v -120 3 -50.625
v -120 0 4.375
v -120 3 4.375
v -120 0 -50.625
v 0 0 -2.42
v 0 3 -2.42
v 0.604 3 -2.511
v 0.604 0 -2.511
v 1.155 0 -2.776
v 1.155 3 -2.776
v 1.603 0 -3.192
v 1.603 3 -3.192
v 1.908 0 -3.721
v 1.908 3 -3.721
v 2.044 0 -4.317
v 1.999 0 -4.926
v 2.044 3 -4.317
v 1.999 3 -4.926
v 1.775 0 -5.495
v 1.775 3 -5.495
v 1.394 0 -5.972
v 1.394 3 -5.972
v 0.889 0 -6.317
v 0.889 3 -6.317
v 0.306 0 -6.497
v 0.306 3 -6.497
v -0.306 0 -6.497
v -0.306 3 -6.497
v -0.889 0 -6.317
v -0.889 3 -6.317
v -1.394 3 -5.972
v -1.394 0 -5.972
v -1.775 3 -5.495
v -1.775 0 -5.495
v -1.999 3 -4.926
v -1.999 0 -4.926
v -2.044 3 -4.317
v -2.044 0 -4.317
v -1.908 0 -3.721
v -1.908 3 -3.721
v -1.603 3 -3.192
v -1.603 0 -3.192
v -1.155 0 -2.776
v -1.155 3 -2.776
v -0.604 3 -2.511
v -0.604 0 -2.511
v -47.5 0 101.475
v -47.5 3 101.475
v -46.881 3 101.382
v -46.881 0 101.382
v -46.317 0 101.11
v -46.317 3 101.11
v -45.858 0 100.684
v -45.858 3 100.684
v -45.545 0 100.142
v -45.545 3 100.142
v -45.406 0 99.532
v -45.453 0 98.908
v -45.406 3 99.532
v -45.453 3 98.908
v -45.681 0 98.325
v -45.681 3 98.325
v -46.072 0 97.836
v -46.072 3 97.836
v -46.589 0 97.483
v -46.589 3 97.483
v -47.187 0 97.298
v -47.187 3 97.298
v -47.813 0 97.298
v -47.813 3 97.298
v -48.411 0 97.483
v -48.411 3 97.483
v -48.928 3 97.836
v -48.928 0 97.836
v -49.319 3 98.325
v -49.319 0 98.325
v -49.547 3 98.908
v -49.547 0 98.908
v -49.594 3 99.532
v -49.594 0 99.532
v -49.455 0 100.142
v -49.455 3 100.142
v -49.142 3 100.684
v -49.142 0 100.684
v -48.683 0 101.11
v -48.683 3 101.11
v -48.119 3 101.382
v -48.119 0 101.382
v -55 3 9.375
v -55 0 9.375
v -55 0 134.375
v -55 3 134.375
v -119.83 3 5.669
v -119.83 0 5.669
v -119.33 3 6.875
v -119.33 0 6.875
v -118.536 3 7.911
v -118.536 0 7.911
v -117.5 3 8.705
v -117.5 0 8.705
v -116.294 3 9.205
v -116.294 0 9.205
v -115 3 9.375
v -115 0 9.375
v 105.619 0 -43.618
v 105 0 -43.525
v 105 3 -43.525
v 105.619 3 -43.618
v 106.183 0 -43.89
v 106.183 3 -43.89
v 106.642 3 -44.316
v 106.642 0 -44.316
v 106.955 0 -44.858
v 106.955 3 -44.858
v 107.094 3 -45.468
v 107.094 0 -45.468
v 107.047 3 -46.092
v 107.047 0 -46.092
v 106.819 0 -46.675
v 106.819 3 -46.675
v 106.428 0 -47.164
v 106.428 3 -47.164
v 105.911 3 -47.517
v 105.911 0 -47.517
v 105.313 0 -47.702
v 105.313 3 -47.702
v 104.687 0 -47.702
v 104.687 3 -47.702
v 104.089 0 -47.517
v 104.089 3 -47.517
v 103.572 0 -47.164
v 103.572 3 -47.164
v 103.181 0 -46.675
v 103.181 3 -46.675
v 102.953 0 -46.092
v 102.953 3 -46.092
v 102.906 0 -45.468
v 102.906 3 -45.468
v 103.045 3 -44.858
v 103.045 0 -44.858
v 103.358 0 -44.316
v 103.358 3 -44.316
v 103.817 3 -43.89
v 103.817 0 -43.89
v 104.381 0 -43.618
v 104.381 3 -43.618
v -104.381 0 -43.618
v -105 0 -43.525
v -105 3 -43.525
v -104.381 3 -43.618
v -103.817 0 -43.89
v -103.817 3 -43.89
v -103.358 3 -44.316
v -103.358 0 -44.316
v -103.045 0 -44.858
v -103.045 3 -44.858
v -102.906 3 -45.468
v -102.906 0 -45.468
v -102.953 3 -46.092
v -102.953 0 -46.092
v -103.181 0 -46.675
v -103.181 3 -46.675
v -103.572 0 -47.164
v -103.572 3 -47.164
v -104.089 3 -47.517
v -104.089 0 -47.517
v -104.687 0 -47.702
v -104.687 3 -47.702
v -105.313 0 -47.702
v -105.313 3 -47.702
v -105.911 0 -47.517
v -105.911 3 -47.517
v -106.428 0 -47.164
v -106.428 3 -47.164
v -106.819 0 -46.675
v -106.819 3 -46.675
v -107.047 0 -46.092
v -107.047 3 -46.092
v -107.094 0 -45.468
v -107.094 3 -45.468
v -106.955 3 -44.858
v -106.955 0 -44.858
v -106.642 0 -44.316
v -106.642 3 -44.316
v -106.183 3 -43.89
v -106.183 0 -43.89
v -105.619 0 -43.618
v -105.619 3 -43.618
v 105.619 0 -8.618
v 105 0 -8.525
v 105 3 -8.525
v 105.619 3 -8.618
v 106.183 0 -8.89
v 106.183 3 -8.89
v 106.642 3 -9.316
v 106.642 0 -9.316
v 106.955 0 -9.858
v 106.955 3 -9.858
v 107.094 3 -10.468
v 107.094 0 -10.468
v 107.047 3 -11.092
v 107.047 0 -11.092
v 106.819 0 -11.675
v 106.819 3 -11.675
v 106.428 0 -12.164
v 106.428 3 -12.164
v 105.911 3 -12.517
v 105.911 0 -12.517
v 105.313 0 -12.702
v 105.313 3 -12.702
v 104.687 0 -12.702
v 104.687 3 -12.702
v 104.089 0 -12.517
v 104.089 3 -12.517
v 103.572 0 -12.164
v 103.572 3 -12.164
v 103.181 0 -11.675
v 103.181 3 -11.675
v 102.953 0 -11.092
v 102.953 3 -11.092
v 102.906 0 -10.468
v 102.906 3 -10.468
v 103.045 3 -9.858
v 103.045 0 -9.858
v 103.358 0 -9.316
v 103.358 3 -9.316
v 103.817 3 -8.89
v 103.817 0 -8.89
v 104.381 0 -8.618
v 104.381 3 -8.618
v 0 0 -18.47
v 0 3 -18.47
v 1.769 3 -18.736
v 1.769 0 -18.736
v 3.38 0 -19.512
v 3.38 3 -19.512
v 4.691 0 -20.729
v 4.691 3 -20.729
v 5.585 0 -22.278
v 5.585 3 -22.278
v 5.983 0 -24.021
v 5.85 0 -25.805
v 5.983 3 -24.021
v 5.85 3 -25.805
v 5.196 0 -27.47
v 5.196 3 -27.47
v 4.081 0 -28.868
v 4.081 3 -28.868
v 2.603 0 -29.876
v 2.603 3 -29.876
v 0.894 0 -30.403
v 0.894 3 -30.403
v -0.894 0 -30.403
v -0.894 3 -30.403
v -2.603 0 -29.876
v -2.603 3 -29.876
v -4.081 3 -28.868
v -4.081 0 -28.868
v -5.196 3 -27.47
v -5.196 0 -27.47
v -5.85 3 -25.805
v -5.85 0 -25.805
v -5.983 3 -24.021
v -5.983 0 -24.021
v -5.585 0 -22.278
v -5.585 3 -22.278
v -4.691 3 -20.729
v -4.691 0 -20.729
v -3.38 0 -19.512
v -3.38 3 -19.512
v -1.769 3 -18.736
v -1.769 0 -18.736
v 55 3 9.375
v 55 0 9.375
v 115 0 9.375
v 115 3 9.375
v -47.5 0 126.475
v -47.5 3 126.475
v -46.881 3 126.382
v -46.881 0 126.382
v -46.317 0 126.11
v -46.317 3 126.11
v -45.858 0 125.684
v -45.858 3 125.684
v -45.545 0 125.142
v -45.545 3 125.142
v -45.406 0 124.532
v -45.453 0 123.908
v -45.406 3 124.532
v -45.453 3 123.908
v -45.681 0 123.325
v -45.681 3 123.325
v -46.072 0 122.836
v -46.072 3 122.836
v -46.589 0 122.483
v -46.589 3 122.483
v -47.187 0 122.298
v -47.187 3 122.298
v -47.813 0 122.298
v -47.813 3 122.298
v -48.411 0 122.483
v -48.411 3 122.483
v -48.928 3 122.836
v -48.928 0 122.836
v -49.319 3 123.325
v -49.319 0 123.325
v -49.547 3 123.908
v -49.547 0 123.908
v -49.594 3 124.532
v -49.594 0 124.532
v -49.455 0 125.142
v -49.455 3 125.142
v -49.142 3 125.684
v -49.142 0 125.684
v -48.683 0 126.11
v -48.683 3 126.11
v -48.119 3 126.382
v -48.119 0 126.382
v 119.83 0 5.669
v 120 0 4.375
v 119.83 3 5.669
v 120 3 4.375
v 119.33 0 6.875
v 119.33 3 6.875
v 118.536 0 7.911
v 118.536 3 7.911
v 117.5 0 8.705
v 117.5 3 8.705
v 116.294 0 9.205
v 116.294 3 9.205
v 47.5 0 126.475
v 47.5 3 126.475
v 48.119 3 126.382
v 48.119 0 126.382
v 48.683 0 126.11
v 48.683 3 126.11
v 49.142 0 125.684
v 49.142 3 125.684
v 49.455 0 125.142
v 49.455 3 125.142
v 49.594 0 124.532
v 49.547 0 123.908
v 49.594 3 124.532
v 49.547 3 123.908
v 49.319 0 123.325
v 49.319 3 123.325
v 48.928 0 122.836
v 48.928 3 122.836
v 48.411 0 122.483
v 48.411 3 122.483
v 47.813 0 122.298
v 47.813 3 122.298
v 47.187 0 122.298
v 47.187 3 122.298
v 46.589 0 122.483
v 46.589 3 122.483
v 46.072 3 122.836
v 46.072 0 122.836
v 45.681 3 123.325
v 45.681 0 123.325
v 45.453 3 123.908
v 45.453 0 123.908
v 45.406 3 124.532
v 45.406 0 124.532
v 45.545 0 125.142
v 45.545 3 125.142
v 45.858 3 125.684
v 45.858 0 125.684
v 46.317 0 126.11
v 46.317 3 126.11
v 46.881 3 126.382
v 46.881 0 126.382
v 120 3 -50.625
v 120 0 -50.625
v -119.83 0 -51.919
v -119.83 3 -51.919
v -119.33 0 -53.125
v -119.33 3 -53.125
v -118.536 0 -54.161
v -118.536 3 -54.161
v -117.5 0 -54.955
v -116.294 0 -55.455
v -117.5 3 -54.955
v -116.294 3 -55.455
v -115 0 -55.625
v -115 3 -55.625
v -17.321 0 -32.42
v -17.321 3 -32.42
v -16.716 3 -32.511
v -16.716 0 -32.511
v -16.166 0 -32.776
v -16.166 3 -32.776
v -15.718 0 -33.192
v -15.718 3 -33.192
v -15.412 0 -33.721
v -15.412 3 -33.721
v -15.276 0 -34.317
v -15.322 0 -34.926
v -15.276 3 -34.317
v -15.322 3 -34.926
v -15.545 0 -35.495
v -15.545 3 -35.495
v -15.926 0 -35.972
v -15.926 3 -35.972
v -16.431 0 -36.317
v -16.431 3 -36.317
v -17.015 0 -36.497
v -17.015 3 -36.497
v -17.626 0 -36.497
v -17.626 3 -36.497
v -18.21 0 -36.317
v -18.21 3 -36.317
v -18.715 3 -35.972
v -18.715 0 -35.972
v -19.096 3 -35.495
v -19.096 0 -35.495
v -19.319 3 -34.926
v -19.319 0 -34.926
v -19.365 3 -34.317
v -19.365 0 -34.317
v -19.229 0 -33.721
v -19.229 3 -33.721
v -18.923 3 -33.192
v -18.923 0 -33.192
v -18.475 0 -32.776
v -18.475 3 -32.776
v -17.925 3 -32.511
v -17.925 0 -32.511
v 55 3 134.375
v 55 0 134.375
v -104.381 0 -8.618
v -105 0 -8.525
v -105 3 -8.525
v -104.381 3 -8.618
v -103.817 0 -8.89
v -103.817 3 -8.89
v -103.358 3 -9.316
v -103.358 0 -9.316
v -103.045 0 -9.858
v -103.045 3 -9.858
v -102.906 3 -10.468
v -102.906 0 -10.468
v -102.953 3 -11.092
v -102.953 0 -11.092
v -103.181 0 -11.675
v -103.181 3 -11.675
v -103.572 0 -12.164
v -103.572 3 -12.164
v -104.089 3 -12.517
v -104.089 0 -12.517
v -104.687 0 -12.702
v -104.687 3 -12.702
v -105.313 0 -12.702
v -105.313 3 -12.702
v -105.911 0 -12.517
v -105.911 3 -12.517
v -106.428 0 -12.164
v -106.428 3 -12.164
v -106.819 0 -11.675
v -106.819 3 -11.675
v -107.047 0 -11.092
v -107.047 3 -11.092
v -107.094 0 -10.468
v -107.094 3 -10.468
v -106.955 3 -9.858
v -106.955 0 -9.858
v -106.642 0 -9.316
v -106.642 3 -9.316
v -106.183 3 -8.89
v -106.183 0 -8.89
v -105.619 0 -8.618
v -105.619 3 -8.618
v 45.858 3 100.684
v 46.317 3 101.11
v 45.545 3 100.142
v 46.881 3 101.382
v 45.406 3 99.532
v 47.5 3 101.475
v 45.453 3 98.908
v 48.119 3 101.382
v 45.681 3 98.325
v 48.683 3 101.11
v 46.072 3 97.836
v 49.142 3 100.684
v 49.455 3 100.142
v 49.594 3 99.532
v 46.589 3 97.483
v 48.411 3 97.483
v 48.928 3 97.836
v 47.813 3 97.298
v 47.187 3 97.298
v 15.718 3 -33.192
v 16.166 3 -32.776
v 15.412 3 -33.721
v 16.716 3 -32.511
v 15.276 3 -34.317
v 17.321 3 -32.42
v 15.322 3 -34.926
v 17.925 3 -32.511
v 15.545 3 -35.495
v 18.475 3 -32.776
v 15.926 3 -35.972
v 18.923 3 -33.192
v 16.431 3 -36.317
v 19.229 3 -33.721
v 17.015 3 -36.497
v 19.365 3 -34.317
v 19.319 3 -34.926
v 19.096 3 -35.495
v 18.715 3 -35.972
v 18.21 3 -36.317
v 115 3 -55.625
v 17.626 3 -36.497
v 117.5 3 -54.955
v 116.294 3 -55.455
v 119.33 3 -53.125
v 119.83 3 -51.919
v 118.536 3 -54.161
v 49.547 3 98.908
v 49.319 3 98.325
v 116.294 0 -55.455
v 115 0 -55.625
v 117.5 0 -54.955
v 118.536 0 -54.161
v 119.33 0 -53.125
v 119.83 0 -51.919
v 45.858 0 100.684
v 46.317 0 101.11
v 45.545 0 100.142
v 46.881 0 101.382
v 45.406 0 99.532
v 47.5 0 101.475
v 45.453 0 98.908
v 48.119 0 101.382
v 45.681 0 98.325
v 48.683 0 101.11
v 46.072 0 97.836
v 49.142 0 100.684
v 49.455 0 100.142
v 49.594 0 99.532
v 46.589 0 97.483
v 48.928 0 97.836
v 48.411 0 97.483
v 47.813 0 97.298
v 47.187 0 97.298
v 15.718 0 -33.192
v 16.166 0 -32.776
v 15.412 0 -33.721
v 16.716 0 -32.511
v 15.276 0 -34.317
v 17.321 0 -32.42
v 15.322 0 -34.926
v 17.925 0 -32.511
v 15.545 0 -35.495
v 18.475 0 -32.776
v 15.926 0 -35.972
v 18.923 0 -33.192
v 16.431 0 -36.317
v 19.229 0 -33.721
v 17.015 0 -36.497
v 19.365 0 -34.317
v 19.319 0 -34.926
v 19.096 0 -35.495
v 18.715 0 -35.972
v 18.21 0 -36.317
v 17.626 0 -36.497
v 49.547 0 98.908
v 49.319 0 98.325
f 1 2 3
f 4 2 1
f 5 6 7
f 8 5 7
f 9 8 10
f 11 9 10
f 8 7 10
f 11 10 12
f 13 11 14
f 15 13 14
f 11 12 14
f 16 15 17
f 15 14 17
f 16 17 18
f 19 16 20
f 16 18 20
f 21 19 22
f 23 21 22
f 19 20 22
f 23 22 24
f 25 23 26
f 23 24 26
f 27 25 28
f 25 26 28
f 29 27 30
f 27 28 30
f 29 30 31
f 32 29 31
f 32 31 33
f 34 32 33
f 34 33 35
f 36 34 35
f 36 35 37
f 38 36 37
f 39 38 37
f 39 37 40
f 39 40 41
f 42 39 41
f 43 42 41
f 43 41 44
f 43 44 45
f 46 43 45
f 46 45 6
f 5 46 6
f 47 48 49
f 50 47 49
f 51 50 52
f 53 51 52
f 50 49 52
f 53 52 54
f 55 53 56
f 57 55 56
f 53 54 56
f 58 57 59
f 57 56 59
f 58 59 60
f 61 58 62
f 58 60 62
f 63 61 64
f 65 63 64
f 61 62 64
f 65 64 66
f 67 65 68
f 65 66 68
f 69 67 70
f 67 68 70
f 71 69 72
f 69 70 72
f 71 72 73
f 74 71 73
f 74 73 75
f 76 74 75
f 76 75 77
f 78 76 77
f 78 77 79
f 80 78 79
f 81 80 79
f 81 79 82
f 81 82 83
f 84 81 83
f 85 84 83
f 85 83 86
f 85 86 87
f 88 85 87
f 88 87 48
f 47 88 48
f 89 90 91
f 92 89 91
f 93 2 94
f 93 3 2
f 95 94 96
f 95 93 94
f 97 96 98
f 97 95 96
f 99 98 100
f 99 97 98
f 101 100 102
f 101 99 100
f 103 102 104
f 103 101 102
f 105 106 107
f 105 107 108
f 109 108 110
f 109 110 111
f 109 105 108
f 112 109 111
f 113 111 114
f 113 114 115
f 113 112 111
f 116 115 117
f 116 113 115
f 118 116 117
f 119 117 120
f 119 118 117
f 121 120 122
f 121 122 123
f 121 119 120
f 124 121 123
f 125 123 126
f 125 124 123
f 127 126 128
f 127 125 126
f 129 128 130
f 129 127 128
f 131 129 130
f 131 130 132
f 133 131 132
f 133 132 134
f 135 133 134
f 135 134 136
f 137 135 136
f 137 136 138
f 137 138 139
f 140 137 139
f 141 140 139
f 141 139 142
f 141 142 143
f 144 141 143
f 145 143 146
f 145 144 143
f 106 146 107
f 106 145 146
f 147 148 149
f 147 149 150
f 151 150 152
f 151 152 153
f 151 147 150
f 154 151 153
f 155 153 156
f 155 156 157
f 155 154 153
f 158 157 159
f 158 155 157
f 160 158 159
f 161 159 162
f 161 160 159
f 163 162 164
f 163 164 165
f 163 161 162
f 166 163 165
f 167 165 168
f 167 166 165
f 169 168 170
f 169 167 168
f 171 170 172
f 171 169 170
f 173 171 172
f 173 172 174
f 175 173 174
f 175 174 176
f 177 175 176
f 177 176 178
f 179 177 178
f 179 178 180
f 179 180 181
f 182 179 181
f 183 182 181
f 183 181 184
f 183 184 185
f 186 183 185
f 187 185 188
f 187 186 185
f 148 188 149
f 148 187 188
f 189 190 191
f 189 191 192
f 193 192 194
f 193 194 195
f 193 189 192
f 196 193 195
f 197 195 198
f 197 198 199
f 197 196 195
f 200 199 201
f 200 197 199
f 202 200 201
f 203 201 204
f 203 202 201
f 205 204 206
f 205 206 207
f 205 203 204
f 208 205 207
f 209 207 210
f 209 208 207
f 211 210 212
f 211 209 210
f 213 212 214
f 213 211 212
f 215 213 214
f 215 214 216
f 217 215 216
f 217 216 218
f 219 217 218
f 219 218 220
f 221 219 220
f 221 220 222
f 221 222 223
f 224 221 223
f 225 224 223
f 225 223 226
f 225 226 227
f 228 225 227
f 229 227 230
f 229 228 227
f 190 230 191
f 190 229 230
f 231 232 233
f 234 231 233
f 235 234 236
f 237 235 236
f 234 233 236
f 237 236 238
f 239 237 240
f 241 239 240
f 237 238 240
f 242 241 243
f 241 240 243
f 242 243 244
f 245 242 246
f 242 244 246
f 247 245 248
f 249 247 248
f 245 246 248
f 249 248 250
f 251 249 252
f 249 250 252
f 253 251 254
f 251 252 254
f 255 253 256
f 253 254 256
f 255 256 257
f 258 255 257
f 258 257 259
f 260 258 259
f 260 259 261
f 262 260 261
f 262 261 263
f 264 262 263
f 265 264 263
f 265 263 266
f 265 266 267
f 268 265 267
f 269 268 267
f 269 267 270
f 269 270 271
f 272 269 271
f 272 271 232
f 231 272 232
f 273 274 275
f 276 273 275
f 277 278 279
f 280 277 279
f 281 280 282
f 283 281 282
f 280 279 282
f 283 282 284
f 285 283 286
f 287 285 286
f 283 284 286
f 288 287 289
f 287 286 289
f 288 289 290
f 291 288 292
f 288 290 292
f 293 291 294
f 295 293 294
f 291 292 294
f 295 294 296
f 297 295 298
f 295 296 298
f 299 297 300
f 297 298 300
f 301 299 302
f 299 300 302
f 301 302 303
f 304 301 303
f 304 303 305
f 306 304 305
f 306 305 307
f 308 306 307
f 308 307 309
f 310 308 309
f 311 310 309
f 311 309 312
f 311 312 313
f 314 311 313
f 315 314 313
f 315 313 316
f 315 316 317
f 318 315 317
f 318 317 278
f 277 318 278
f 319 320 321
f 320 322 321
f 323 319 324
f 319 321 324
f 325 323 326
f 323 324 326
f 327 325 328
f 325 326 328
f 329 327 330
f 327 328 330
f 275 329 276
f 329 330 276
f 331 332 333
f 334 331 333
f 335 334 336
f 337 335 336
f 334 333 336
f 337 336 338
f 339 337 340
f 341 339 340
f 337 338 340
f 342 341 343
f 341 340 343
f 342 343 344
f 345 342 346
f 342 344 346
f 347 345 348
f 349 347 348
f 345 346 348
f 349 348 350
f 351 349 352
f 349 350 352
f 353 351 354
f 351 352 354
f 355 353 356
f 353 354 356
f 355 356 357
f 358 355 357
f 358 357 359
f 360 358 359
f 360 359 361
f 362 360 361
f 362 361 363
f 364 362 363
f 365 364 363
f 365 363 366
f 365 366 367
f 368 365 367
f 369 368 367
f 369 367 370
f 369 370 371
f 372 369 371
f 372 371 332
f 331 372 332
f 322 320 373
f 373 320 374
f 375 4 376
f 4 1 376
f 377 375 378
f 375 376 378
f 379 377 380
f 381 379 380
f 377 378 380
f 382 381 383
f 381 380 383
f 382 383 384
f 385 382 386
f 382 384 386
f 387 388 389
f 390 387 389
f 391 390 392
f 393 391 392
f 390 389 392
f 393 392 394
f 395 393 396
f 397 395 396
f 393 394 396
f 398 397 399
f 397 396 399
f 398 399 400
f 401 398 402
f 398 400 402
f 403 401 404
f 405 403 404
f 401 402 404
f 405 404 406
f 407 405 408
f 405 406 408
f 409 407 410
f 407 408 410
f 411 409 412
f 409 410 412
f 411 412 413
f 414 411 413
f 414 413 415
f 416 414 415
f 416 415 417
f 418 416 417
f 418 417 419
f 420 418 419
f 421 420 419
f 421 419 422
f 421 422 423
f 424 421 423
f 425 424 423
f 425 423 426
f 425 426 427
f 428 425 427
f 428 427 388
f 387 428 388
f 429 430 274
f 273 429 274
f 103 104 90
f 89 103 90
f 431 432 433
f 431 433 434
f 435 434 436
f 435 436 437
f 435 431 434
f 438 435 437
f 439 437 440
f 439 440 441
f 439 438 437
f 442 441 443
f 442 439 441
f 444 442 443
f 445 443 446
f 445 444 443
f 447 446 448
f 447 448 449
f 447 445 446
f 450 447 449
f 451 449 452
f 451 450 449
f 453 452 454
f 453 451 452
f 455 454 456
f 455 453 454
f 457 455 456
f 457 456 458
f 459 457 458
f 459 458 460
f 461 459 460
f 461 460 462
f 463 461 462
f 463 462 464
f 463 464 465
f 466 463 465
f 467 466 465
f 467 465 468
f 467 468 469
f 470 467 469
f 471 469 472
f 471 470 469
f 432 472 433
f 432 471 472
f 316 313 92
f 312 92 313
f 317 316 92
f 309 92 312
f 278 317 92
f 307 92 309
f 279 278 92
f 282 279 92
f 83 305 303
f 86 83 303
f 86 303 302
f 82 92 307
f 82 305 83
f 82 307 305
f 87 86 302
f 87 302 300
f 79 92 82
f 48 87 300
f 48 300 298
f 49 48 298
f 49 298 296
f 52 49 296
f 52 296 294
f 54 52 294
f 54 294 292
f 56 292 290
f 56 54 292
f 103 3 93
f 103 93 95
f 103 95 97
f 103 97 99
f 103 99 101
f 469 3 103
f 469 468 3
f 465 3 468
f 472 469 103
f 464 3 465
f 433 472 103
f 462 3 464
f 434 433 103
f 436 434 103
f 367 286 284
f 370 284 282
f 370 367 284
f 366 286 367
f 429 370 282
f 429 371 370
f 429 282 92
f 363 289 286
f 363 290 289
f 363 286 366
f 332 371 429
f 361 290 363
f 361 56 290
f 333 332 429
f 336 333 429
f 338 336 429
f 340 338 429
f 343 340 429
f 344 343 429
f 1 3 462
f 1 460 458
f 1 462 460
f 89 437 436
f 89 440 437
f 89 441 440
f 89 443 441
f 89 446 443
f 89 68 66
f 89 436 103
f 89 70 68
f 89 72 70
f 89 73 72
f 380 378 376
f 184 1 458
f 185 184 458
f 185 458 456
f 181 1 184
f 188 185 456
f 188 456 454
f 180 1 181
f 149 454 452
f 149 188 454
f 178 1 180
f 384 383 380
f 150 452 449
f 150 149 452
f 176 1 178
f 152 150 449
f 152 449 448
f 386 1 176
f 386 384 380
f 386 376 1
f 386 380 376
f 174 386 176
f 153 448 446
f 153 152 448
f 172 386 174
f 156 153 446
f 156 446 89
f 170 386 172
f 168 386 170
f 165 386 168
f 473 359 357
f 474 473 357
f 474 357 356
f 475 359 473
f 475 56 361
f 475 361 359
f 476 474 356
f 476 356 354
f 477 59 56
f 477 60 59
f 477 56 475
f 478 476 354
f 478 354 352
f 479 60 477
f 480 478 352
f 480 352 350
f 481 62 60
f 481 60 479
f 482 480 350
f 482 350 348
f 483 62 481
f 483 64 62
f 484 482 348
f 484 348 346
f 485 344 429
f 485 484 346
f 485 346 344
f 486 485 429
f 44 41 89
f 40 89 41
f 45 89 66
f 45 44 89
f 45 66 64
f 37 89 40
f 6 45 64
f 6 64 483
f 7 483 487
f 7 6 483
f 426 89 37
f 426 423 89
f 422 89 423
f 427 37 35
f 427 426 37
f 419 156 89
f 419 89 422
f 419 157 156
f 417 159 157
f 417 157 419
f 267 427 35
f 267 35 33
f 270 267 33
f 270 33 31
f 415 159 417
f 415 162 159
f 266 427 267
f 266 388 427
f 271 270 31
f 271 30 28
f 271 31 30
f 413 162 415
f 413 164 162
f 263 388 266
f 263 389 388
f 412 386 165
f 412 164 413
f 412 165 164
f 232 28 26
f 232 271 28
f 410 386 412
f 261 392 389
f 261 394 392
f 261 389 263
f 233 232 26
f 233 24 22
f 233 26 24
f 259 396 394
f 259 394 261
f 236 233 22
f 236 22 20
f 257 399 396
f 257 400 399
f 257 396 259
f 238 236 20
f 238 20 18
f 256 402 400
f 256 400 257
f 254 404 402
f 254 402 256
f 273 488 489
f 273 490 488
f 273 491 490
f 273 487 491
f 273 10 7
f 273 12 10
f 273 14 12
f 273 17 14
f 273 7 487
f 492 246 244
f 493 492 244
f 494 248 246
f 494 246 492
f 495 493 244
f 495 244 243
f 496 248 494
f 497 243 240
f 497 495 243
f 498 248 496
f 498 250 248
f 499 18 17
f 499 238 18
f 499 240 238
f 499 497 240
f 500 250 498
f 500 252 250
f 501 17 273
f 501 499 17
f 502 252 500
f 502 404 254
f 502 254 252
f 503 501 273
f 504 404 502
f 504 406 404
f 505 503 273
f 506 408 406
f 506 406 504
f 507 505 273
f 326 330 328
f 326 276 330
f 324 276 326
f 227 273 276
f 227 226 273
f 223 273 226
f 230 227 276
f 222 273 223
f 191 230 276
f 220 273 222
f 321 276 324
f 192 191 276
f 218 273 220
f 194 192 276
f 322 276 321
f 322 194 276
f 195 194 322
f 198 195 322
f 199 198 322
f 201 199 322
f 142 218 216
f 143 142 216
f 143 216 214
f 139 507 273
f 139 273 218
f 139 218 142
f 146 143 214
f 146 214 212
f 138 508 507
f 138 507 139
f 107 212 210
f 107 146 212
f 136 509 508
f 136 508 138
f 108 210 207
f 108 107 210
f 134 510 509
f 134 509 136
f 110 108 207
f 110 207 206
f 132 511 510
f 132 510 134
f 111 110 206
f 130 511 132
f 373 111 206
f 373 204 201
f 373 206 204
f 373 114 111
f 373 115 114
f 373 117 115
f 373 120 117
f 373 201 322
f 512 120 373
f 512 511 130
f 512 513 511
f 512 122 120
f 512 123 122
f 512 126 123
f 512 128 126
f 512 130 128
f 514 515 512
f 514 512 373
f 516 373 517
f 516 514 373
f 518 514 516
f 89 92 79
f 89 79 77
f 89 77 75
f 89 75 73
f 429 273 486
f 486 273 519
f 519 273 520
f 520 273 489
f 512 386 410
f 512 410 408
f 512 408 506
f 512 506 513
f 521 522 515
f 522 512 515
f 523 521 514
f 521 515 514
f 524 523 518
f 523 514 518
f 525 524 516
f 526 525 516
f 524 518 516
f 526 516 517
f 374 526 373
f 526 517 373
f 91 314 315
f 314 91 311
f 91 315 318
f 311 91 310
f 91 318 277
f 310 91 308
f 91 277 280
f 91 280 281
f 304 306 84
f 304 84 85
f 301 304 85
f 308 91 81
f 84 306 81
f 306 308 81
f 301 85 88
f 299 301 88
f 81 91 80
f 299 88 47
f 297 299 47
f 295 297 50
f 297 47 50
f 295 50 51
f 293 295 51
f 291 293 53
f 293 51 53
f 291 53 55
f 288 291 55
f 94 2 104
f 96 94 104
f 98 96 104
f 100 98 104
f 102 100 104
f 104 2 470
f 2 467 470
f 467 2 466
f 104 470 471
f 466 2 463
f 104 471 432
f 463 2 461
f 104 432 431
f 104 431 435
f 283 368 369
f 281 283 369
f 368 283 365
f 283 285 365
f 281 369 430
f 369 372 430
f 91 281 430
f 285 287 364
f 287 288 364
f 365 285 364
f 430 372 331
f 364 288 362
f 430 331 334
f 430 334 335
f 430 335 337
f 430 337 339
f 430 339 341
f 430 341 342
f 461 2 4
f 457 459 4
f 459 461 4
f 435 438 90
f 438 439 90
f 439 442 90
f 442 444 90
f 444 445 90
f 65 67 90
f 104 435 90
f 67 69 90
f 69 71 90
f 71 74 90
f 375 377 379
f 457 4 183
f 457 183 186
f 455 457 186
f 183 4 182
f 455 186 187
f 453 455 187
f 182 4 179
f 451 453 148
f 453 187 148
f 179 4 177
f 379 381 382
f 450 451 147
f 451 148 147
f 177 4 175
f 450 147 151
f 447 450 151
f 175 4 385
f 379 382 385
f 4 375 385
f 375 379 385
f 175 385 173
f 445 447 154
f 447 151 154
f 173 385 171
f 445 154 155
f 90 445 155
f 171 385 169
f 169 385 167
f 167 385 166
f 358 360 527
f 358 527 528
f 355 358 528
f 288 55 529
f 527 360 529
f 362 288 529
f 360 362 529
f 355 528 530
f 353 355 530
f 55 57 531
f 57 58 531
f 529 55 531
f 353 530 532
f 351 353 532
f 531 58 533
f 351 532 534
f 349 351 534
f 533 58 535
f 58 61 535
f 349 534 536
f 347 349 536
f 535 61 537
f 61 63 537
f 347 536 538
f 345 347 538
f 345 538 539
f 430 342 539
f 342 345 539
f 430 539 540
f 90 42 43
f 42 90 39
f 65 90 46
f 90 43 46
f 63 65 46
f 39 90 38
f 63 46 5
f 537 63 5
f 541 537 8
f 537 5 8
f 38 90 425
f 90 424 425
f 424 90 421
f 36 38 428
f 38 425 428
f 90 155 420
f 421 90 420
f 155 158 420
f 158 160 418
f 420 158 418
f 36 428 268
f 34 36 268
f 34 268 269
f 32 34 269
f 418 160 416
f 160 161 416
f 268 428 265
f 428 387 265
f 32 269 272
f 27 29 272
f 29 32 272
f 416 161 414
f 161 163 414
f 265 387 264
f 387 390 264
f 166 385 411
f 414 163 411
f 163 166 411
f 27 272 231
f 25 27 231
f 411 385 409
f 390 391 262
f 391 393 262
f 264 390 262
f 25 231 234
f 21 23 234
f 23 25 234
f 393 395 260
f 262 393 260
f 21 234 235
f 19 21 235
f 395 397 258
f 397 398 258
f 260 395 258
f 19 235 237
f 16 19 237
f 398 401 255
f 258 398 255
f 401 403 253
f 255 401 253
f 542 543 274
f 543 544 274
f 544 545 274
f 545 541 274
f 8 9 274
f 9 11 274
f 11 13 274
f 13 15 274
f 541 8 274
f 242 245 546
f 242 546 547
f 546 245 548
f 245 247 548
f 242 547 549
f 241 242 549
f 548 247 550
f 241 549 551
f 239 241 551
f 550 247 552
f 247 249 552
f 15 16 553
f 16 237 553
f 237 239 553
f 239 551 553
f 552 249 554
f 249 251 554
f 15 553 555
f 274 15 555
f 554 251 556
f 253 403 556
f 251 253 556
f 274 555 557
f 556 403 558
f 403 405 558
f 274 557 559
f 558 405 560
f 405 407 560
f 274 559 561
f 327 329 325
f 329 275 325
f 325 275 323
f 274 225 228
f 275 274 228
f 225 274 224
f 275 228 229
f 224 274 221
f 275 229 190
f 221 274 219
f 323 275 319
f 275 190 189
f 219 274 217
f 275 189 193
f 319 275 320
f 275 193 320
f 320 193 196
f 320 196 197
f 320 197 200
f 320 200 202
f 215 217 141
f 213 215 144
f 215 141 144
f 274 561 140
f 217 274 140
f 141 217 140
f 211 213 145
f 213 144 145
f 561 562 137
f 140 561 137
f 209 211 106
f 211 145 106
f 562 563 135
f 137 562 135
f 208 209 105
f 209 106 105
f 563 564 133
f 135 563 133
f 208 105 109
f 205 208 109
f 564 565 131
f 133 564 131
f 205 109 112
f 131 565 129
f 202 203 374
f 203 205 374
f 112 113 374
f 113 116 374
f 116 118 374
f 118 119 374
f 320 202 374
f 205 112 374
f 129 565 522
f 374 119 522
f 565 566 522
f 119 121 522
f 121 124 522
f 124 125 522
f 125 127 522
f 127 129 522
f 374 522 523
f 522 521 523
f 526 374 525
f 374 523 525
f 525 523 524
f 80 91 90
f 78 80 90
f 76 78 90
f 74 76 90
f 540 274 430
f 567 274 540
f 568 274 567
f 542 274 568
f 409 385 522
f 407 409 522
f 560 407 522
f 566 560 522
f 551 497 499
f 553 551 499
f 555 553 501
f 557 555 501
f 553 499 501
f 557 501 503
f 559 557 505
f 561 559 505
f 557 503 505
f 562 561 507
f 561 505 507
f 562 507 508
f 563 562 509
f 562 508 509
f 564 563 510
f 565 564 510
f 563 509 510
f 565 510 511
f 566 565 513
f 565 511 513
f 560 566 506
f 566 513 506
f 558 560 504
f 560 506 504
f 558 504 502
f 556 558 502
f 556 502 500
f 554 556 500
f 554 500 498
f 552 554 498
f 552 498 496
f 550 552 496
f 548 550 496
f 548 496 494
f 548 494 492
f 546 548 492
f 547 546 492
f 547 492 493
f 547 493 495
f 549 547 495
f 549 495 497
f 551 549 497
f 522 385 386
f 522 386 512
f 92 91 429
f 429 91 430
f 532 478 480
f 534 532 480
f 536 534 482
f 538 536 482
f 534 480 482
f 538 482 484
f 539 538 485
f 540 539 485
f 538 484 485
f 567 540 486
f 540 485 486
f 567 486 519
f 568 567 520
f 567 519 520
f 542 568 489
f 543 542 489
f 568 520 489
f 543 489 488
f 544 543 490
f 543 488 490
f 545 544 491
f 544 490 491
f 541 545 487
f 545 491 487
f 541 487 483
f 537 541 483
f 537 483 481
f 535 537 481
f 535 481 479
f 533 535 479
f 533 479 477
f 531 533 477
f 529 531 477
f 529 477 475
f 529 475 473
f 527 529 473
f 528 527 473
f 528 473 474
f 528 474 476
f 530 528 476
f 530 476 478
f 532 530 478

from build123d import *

# Parameters (mm, degrees)
SKETCH_1_W          = 240
SKETCH_1_H          = 65
SKETCH_1_R          = 2.1
EXTRUDE_1_DEPTH     = 3
FILLET_1_R          = 5
SKETCH_5_R          = 2.1
CUT_EXTRUDE_4_DEPTH = 10
SKETCH_3_R          = 6
SKETCH_3_R_2        = 2.05
CUT_EXTRUDE_5_DEPTH = 10


with BuildPart() as part:
    # 草图1 → 凸台-拉伸1 (new body)
    # profile 1 of 2: a face of its own
    with BuildSketch(Plane(origin=(0, 0, 0), x_dir=(1, 0, 0), z_dir=(0, 1, 0))):
        with Locations((0, 23.125)):
            Rectangle(SKETCH_1_W, SKETCH_1_H)
        with Locations(Location((105, 10.625, 0), (0, 0, 270))):
            Circle(SKETCH_1_R, mode=Mode.SUBTRACT)
        with Locations(Location((-105, 10.625, 0), (0, 0, 270))):
            Circle(SKETCH_1_R, mode=Mode.SUBTRACT)
        with Locations(Location((-105, 45.625, 0), (0, 0, 270))):
            Circle(SKETCH_1_R, mode=Mode.SUBTRACT)
        with Locations(Location((105, 45.625, 0), (0, 0, 270))):
            Circle(SKETCH_1_R, mode=Mode.SUBTRACT)
    # profile 2 of 2: a face of its own
    with BuildSketch(Plane(origin=(0, 0, 0), x_dir=(1, 0, 0), z_dir=(0, 1, 0))):
        Polygon((13.003862914, -9.375), (-55, -9.375), (-55, -134.375), (55, -134.375), (55, -9.375), align=None)
    extrude(amount=EXTRUDE_1_DEPTH)

    # 圆角1
    fillet_1_edges = [part.edges().sort_by_distance(p)[0] for p in [
        (-120, 1.5, 9.375),
        (-120, 1.5, -55.625),
        (120, 1.5, -55.625),
        (120, 1.5, 9.375),
    ]]
    fillet(fillet_1_edges, radius=FILLET_1_R)

    # 草图5 → 切除-拉伸4 (cut)
    with BuildSketch(Plane(origin=(0, 3, 0), x_dir=(1, 0, 0), z_dir=(0, 1, 0))):
        with Locations(Location((-47.5, -124.375, 0), (0, 0, 270))):
            Circle(SKETCH_5_R)
        with Locations(Location((47.5, -124.375, 0), (0, 0, 270))):
            Circle(SKETCH_5_R)
        with Locations(Location((47.5, -99.375, 0), (0, 0, 270))):
            Circle(SKETCH_5_R)
        with Locations(Location((-47.5, -99.375, 0), (0, 0, 270))):
            Circle(SKETCH_5_R)
    extrude(amount=-CUT_EXTRUDE_4_DEPTH, mode=Mode.SUBTRACT)

    # 草图3 → 切除-拉伸5 (cut)
    with BuildSketch(Plane(origin=(0, 3, 0), x_dir=(1, 0, 0), z_dir=(0, 1, 0))):
        with Locations(Location((0, 24.469725565, 0), (0, 0, 270))):
            Circle(SKETCH_3_R)
        with Locations(Location((0, 4.469725565, 0), (0, 0, 270))):
            Circle(SKETCH_3_R_2)
        with Locations(Location((-17.320508076, 34.469725565, 0), (0, 0, 270))):
            Circle(SKETCH_3_R_2)
        with Locations(Location((17.320508076, 34.469725565, 0), (0, 0, 270))):
            Circle(SKETCH_3_R_2)
    extrude(amount=-CUT_EXTRUDE_5_DEPTH, mode=Mode.SUBTRACT)


solid = part.part
